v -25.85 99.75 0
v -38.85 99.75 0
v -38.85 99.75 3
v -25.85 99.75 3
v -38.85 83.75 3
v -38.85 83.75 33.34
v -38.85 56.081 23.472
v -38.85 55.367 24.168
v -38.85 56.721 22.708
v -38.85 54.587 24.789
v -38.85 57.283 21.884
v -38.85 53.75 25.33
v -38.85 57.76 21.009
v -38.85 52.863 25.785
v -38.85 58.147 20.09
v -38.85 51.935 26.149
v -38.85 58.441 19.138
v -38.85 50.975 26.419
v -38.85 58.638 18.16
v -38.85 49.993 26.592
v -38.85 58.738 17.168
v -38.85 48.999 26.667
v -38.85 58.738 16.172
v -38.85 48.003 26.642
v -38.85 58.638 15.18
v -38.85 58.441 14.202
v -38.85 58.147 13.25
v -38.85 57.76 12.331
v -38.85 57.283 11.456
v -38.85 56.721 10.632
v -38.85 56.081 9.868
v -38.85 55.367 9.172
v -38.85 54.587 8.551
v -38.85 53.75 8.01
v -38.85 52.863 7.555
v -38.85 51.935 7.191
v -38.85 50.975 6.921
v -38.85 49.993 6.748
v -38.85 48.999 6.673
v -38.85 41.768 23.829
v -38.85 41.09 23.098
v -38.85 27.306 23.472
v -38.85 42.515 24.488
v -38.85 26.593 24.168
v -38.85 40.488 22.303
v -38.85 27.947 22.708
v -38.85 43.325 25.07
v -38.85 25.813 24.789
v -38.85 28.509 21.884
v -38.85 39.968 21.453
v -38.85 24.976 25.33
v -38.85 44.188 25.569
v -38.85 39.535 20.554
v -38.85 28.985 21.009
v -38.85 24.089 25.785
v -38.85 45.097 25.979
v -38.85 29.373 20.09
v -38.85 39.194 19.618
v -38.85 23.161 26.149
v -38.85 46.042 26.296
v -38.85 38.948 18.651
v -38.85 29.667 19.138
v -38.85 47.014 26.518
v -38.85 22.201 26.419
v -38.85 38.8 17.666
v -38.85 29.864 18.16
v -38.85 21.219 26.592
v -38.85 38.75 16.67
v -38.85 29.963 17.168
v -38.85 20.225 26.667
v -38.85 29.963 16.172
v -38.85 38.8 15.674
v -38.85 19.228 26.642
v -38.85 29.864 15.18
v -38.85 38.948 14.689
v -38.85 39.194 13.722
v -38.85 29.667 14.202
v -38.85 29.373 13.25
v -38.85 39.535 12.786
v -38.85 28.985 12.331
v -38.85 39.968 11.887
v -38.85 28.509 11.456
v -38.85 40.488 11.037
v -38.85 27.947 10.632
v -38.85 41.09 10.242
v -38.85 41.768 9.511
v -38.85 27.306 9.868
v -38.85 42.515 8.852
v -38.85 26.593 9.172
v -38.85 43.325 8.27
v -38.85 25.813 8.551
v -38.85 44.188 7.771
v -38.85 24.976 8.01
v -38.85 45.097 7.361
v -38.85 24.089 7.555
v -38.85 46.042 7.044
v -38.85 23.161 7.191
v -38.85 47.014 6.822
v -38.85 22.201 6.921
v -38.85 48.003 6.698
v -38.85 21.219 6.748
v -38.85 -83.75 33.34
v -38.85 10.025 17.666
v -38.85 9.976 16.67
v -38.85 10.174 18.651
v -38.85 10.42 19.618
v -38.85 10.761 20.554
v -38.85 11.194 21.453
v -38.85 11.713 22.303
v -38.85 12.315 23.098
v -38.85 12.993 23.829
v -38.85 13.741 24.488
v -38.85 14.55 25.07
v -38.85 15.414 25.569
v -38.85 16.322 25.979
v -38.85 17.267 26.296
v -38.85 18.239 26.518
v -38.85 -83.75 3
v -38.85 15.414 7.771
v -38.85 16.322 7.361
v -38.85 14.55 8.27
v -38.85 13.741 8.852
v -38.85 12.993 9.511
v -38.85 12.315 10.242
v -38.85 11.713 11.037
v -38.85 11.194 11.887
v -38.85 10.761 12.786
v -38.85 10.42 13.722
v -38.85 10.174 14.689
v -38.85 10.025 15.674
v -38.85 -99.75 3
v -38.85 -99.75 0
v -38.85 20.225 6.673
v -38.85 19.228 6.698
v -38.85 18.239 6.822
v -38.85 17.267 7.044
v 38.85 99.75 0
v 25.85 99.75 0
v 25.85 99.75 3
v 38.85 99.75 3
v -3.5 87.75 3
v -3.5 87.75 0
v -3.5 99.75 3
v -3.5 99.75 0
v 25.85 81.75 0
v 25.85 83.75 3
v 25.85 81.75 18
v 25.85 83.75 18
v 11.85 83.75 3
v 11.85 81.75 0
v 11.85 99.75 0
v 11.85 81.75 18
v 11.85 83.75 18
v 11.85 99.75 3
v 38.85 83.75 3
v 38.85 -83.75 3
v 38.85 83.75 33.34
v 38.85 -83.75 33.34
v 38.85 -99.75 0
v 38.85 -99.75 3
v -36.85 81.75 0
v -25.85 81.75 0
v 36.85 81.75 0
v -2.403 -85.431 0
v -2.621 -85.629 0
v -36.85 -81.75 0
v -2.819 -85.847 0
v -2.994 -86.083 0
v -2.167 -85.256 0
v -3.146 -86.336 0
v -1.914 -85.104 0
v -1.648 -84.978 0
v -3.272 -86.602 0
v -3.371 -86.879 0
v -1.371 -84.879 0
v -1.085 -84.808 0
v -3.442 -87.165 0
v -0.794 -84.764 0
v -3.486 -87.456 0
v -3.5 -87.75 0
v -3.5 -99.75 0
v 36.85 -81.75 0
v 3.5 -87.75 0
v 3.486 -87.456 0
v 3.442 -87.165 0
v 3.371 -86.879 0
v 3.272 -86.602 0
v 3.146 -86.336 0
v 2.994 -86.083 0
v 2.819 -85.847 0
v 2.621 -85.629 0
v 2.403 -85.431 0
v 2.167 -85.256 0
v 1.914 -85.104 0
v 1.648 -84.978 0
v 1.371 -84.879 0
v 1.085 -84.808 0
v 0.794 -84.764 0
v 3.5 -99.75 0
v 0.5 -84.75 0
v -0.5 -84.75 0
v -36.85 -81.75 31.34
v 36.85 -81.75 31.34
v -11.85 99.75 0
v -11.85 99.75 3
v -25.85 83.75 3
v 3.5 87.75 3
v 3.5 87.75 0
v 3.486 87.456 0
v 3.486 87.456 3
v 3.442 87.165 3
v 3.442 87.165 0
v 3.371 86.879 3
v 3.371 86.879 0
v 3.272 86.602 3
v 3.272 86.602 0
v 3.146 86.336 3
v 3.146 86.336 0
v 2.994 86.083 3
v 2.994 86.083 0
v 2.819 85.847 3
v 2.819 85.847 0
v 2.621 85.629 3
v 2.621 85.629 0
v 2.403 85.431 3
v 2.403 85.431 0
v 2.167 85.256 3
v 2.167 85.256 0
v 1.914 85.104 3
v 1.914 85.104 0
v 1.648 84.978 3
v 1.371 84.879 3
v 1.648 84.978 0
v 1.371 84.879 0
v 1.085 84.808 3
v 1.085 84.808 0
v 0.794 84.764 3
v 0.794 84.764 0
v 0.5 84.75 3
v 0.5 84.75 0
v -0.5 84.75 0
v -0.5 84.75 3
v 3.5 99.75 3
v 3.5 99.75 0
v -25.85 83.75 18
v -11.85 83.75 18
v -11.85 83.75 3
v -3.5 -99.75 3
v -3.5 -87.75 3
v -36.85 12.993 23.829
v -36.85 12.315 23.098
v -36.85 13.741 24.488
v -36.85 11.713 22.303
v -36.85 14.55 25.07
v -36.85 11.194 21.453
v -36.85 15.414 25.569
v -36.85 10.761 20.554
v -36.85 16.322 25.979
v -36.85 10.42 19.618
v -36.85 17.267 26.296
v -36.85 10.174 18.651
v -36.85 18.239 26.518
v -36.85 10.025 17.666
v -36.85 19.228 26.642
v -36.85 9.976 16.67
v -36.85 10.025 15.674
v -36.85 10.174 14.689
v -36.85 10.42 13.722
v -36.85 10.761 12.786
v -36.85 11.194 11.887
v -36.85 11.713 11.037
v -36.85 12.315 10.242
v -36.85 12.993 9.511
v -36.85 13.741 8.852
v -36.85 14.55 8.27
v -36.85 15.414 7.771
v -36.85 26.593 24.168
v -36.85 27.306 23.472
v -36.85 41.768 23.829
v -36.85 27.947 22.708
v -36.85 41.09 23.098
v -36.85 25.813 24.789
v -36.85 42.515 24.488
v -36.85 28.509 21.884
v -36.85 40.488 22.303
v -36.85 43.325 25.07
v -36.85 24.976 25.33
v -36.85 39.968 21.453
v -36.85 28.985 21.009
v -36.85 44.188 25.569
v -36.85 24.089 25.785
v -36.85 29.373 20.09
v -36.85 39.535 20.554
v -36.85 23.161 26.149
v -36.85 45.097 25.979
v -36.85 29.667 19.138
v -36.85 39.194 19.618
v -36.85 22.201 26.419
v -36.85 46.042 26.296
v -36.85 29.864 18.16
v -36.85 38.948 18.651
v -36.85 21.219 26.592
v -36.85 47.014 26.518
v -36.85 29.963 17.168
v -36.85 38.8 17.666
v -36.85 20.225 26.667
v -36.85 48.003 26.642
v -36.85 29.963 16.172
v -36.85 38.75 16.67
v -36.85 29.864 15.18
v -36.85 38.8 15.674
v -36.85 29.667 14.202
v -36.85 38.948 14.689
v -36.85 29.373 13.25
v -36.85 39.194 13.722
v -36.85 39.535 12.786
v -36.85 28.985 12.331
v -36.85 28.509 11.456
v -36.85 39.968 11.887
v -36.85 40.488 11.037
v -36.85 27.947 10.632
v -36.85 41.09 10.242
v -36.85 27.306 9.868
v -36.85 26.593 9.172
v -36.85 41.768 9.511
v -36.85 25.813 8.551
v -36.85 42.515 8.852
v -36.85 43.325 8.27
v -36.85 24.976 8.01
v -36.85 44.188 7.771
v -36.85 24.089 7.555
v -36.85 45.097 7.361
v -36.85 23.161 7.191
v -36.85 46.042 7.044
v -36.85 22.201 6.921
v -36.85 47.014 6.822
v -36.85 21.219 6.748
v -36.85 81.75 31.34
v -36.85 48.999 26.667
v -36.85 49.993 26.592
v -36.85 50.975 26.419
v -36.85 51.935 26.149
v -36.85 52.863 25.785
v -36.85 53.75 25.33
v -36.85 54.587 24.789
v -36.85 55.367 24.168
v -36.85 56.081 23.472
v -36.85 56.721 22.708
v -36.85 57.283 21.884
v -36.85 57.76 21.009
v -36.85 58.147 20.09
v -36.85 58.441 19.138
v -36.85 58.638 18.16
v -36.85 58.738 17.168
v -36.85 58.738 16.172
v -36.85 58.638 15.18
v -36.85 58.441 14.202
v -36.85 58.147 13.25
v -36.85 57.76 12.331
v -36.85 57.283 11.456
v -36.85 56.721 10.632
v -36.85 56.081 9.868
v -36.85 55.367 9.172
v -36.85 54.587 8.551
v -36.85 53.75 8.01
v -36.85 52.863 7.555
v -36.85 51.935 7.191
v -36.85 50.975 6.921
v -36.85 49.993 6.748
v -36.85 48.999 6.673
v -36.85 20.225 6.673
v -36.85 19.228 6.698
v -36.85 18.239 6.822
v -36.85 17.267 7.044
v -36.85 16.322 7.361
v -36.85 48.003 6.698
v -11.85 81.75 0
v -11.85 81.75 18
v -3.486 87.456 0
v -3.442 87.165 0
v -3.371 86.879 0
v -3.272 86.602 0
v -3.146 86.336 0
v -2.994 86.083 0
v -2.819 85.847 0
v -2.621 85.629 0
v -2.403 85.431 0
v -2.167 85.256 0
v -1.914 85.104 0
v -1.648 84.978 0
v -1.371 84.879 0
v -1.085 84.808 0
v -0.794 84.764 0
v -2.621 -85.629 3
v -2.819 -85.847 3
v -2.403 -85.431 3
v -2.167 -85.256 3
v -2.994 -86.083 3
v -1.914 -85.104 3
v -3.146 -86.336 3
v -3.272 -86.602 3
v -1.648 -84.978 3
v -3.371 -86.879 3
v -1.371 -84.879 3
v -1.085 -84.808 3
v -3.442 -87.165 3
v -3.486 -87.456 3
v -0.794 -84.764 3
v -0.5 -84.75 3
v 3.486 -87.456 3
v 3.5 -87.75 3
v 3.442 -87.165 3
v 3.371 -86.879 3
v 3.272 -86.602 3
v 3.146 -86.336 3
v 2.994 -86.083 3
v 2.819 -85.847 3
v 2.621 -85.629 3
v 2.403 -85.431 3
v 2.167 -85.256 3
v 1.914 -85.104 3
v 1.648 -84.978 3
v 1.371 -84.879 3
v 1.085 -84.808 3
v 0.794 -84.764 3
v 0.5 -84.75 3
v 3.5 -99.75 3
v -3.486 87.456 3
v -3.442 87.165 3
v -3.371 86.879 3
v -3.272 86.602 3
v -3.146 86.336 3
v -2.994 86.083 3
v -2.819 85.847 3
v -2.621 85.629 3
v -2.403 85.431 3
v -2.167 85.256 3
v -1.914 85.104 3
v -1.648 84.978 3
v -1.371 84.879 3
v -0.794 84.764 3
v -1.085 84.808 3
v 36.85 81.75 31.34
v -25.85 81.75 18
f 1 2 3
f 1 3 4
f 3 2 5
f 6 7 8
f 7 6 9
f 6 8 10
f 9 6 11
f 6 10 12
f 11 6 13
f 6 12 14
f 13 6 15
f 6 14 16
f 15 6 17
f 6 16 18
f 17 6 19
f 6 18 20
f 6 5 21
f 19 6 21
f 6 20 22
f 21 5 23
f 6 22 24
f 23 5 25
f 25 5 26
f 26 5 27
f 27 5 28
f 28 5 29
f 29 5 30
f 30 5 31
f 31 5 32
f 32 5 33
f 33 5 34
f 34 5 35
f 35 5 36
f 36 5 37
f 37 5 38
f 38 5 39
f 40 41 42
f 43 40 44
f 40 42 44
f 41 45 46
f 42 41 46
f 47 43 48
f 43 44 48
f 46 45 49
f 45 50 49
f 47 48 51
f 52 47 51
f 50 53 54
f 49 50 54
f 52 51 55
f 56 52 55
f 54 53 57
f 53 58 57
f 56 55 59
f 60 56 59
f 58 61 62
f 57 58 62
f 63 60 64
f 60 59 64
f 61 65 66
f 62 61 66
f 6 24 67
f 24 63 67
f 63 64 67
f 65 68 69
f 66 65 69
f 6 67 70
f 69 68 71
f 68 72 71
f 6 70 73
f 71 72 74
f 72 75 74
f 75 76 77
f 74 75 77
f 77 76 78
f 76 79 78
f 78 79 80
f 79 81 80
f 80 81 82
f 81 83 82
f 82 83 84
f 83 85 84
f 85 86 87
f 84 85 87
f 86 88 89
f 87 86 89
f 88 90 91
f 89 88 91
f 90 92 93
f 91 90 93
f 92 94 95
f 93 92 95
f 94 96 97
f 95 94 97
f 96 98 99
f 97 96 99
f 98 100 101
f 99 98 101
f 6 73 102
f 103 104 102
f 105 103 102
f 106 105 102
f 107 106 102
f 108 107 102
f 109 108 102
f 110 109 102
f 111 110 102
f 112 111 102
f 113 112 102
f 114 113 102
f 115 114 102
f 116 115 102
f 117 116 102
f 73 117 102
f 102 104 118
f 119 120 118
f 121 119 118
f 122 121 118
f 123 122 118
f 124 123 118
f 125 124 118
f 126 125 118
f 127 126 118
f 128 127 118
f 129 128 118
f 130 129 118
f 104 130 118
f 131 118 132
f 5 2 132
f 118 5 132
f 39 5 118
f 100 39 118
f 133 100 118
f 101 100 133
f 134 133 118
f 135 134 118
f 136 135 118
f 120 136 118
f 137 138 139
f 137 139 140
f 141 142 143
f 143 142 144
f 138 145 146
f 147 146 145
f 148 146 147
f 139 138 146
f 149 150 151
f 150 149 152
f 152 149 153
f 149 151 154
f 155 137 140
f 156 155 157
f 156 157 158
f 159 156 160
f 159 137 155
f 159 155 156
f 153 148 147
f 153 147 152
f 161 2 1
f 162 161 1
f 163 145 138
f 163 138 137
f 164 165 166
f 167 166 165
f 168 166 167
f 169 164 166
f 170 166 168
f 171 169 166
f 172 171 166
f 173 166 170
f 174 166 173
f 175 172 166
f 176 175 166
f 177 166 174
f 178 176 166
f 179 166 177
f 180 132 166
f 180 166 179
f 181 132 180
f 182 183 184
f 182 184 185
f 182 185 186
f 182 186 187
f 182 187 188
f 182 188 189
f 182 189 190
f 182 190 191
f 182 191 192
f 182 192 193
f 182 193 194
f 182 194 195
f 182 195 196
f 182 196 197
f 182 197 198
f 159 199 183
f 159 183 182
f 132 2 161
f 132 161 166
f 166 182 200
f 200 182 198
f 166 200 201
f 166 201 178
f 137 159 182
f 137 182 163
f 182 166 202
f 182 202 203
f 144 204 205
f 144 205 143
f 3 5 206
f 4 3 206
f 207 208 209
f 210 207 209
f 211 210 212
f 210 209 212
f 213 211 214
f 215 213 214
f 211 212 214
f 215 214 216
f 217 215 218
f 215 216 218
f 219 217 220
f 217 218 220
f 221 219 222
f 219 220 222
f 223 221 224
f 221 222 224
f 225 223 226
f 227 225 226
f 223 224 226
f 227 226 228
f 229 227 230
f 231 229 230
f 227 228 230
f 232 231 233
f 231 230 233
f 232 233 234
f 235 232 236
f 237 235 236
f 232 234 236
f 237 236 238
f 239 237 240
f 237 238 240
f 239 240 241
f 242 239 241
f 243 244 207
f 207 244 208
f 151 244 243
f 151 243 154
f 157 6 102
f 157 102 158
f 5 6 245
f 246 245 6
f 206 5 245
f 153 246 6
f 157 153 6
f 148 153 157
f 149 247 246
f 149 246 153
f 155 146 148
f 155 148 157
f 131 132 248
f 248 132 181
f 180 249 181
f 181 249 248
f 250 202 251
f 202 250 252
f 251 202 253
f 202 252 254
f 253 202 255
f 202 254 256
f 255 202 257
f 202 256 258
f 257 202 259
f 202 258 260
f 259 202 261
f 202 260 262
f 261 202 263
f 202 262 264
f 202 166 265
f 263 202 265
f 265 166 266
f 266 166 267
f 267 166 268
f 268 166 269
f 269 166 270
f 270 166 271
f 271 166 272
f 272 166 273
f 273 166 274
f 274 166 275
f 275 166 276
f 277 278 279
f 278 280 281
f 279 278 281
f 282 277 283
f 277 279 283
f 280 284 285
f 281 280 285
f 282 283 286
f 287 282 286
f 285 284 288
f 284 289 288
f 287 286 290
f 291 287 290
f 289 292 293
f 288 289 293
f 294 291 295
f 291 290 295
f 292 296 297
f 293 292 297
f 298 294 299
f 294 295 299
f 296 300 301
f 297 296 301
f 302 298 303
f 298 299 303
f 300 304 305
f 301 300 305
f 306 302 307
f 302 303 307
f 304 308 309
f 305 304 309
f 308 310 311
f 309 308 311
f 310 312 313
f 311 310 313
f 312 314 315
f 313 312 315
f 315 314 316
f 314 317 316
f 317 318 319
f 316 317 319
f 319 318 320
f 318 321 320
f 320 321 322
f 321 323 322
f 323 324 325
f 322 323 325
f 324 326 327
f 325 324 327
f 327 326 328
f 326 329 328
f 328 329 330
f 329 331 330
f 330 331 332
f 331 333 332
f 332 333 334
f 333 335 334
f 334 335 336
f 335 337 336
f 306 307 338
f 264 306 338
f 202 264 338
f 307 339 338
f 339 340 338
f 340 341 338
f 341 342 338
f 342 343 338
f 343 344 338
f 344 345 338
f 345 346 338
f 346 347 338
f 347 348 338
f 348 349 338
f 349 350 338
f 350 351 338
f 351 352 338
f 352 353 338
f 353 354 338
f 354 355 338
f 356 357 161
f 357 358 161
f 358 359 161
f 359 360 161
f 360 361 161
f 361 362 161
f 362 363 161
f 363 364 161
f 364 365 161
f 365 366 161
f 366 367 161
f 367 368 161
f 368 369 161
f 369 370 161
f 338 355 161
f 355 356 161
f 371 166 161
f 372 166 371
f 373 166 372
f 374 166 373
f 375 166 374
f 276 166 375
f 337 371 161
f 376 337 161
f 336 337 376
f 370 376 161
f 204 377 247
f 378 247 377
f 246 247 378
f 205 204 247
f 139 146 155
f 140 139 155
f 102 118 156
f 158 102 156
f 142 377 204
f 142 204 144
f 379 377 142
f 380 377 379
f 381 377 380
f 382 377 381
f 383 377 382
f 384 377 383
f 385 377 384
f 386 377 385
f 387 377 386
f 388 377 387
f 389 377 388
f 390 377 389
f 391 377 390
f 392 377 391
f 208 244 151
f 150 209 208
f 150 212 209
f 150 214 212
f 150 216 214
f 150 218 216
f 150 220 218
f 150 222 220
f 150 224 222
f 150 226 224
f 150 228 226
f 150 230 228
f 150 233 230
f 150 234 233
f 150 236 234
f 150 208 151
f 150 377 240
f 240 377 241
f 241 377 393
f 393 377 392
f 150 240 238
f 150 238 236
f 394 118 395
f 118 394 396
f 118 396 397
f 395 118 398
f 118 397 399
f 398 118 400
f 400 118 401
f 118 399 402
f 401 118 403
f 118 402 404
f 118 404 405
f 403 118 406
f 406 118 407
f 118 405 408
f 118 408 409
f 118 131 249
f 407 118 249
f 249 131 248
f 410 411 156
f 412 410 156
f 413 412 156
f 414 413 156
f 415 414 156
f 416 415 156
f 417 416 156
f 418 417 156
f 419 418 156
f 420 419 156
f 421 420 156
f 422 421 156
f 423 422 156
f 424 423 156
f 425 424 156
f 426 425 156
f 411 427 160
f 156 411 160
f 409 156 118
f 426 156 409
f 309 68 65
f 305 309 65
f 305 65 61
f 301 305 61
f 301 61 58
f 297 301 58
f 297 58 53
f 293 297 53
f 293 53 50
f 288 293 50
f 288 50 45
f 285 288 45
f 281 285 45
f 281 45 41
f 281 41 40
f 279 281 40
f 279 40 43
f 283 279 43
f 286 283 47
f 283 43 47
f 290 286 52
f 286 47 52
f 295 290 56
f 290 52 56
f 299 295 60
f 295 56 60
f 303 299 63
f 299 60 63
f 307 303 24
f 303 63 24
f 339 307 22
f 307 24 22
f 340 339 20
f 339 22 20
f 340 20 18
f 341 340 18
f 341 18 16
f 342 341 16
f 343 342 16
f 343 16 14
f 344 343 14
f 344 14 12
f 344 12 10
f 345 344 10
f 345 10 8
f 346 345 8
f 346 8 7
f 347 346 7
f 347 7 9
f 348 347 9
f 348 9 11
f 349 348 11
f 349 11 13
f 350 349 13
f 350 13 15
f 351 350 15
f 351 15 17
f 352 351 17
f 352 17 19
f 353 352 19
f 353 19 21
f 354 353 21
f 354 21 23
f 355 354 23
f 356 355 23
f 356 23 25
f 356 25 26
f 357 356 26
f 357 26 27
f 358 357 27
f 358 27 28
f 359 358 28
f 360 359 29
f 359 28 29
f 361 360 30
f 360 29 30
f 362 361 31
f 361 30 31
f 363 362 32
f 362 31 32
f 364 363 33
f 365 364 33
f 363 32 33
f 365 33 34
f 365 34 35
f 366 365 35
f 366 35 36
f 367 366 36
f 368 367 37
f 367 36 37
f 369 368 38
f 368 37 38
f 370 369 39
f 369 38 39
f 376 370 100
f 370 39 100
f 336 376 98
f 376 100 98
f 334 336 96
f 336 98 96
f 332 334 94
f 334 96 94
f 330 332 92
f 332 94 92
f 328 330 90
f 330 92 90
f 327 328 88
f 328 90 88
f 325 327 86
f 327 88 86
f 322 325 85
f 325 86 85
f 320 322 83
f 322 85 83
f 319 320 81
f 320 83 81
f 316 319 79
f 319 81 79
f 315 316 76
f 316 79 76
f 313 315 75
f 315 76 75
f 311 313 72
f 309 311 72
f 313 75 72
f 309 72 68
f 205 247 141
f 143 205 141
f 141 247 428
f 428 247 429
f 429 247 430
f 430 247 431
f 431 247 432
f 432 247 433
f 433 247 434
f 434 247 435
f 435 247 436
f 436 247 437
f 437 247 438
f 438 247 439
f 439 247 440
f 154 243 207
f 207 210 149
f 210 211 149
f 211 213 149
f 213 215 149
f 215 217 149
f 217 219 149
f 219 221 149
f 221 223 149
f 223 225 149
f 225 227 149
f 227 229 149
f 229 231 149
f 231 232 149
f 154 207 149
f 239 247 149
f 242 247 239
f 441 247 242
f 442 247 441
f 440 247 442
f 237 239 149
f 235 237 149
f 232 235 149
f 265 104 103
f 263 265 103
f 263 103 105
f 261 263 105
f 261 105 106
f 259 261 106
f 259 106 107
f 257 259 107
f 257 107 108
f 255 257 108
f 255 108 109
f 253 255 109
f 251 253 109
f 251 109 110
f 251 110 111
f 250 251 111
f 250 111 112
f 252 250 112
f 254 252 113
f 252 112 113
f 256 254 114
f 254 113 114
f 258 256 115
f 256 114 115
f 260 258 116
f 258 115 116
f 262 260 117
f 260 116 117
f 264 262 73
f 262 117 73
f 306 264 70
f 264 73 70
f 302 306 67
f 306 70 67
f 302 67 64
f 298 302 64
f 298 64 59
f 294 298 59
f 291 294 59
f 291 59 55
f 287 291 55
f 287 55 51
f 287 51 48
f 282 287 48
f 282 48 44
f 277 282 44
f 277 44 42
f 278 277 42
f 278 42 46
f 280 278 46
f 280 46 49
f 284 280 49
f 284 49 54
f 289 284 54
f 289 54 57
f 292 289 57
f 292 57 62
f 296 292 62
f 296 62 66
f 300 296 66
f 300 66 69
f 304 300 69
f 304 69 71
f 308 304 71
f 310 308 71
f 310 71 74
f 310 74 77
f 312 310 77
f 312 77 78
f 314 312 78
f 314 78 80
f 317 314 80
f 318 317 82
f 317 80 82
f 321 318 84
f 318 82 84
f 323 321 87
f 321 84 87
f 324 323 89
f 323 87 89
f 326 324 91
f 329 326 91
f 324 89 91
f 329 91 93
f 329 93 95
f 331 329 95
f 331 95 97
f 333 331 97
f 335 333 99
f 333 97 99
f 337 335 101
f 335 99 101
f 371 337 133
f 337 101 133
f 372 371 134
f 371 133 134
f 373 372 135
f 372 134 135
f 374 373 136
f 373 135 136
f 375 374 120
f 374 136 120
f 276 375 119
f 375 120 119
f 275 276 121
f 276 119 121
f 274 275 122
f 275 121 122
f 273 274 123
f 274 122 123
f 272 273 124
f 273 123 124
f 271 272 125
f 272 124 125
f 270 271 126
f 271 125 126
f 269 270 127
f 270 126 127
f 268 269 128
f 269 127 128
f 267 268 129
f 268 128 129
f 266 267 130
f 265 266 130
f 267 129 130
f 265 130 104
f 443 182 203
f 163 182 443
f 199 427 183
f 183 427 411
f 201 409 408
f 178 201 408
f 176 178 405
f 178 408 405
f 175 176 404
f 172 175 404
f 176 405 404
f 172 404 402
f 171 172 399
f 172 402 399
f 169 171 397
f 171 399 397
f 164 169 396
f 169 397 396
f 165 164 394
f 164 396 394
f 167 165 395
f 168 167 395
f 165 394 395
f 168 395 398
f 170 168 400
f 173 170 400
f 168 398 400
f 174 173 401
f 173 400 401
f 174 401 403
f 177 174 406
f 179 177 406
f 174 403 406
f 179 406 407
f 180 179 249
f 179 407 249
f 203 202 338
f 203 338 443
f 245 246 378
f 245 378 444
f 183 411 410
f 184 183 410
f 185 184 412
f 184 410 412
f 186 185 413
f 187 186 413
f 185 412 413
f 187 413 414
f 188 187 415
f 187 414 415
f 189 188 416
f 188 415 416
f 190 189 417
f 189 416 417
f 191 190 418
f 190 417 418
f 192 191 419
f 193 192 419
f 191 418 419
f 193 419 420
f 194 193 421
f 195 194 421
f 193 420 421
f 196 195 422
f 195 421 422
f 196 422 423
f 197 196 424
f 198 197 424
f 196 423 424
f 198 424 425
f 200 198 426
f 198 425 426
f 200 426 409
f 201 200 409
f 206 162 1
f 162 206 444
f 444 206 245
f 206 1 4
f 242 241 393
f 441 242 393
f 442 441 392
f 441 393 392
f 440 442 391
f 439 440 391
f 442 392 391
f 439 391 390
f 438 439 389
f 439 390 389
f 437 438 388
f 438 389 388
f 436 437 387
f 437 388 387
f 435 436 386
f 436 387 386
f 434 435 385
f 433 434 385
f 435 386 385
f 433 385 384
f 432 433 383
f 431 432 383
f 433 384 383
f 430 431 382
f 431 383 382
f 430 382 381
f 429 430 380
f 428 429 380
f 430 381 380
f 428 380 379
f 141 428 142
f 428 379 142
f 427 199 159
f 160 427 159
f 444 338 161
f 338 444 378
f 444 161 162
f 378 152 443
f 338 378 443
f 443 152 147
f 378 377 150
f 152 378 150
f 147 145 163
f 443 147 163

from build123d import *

# Parameters (mm, degrees)
F0_W      = 77.7
F0_H      = 167.5
F1_DEPTH  = 33.34
F2_T      = -2
F3_R      = 10
F4_DEPTH  = 25
F5_W      = 77.7
F5_H      = 16
F6_DEPTH  = 3
F8_DEPTH  = 25
F9_W      = 77.7
F9_H      = 16
F10_DEPTH = 3
F12_DEPTH = 25
F13_W     = 14
F13_H     = 18
F14_DEPTH = 25


with BuildPart() as f1:
    # F0 (on Top) → F1 (new body)
    with BuildSketch(Plane.XY):
        Rectangle(F0_W, F0_H)
    extrude(amount=F1_DEPTH)

    # F2
    f2_openings = [f1.faces().sort_by_distance(p)[0] for p in [
        (0, 0, 0),
    ]]
    offset(amount=F2_T, openings=f2_openings)

    # F3 (on face) → F4 (cut)
    with BuildSketch(Plane(origin=(-38.85, 0, 0), x_dir=(0, -1, 0), z_dir=(-1, 0, 0))):
        with Locations((-19.975796, 16.67)):
            Circle(F3_R)
        with Locations((-48.75, 16.67)):
            Circle(F3_R)
    extrude(amount=-F4_DEPTH, mode=Mode.SUBTRACT)

    # F5 (on face) → F6 (join)
    with BuildSketch(Plane(origin=(0, 0, 0), x_dir=(1, 0, 0), z_dir=(0, 0, -1))):
        with Locations((0, 91.75)):
            Rectangle(F5_W, F5_H)
    extrude(amount=-F6_DEPTH)

    # F7 (on face) → F8 (cut)
    with BuildSketch(Plane.XY.offset(3)):
        with BuildLine():
            Line((-3.5, -87.75), (-3.5, -99.75))
            Line((-3.5, -99.75), (3.5, -99.75))
            Line((3.5, -99.75), (3.5, -87.75))
            ThreePointArc((3.5, -87.75), (2.62132, -85.62868), (0.5, -84.75))
            Line((0.5, -84.75), (-0.5, -84.75))
            ThreePointArc((-0.5, -84.75), (-2.62132, -85.62868), (-3.5, -87.75))
        make_face()
    extrude(amount=-F8_DEPTH, mode=Mode.SUBTRACT)

    # F9 (on face) → F10 (join)
    with BuildSketch(Plane(origin=(0, 0, 0), x_dir=(1, 0, 0), z_dir=(0, 0, -1))):
        with Locations((0, -91.75)):
            Rectangle(F9_W, F9_H)
    extrude(amount=-F10_DEPTH)

    # F11 (on face) → F12 (cut)
    with BuildSketch(Plane(origin=(0, 0, 0), x_dir=(1, 0, 0), z_dir=(0, 0, -1))):
        with BuildLine():
            Line((-3.5, -87.75), (-3.5, -99.75))
            Line((-3.5, -99.75), (3.5, -99.75))
            Line((3.5, -99.75), (3.5, -87.75))
            ThreePointArc((3.5, -87.75), (2.62132, -85.62868), (0.5, -84.75))
            Line((0.5, -84.75), (-0.5, -84.75))
            ThreePointArc((-0.5, -84.75), (-2.62132, -85.62868), (-3.5, -87.75))
        make_face()
    extrude(amount=-F12_DEPTH, mode=Mode.SUBTRACT)

    # F13 (on face) → F14 (cut)
    with BuildSketch(Plane(origin=(0, 99.75, 0), x_dir=(-1, 0, 0), z_dir=(0, 1, 0))):
        with Locations((18.85, 9)):
            Rectangle(F13_W, F13_H)
        with Locations((-18.85, 9)):
            Rectangle(F13_W, F13_H)
    extrude(amount=-F14_DEPTH, mode=Mode.SUBTRACT)


solid = f1.part
